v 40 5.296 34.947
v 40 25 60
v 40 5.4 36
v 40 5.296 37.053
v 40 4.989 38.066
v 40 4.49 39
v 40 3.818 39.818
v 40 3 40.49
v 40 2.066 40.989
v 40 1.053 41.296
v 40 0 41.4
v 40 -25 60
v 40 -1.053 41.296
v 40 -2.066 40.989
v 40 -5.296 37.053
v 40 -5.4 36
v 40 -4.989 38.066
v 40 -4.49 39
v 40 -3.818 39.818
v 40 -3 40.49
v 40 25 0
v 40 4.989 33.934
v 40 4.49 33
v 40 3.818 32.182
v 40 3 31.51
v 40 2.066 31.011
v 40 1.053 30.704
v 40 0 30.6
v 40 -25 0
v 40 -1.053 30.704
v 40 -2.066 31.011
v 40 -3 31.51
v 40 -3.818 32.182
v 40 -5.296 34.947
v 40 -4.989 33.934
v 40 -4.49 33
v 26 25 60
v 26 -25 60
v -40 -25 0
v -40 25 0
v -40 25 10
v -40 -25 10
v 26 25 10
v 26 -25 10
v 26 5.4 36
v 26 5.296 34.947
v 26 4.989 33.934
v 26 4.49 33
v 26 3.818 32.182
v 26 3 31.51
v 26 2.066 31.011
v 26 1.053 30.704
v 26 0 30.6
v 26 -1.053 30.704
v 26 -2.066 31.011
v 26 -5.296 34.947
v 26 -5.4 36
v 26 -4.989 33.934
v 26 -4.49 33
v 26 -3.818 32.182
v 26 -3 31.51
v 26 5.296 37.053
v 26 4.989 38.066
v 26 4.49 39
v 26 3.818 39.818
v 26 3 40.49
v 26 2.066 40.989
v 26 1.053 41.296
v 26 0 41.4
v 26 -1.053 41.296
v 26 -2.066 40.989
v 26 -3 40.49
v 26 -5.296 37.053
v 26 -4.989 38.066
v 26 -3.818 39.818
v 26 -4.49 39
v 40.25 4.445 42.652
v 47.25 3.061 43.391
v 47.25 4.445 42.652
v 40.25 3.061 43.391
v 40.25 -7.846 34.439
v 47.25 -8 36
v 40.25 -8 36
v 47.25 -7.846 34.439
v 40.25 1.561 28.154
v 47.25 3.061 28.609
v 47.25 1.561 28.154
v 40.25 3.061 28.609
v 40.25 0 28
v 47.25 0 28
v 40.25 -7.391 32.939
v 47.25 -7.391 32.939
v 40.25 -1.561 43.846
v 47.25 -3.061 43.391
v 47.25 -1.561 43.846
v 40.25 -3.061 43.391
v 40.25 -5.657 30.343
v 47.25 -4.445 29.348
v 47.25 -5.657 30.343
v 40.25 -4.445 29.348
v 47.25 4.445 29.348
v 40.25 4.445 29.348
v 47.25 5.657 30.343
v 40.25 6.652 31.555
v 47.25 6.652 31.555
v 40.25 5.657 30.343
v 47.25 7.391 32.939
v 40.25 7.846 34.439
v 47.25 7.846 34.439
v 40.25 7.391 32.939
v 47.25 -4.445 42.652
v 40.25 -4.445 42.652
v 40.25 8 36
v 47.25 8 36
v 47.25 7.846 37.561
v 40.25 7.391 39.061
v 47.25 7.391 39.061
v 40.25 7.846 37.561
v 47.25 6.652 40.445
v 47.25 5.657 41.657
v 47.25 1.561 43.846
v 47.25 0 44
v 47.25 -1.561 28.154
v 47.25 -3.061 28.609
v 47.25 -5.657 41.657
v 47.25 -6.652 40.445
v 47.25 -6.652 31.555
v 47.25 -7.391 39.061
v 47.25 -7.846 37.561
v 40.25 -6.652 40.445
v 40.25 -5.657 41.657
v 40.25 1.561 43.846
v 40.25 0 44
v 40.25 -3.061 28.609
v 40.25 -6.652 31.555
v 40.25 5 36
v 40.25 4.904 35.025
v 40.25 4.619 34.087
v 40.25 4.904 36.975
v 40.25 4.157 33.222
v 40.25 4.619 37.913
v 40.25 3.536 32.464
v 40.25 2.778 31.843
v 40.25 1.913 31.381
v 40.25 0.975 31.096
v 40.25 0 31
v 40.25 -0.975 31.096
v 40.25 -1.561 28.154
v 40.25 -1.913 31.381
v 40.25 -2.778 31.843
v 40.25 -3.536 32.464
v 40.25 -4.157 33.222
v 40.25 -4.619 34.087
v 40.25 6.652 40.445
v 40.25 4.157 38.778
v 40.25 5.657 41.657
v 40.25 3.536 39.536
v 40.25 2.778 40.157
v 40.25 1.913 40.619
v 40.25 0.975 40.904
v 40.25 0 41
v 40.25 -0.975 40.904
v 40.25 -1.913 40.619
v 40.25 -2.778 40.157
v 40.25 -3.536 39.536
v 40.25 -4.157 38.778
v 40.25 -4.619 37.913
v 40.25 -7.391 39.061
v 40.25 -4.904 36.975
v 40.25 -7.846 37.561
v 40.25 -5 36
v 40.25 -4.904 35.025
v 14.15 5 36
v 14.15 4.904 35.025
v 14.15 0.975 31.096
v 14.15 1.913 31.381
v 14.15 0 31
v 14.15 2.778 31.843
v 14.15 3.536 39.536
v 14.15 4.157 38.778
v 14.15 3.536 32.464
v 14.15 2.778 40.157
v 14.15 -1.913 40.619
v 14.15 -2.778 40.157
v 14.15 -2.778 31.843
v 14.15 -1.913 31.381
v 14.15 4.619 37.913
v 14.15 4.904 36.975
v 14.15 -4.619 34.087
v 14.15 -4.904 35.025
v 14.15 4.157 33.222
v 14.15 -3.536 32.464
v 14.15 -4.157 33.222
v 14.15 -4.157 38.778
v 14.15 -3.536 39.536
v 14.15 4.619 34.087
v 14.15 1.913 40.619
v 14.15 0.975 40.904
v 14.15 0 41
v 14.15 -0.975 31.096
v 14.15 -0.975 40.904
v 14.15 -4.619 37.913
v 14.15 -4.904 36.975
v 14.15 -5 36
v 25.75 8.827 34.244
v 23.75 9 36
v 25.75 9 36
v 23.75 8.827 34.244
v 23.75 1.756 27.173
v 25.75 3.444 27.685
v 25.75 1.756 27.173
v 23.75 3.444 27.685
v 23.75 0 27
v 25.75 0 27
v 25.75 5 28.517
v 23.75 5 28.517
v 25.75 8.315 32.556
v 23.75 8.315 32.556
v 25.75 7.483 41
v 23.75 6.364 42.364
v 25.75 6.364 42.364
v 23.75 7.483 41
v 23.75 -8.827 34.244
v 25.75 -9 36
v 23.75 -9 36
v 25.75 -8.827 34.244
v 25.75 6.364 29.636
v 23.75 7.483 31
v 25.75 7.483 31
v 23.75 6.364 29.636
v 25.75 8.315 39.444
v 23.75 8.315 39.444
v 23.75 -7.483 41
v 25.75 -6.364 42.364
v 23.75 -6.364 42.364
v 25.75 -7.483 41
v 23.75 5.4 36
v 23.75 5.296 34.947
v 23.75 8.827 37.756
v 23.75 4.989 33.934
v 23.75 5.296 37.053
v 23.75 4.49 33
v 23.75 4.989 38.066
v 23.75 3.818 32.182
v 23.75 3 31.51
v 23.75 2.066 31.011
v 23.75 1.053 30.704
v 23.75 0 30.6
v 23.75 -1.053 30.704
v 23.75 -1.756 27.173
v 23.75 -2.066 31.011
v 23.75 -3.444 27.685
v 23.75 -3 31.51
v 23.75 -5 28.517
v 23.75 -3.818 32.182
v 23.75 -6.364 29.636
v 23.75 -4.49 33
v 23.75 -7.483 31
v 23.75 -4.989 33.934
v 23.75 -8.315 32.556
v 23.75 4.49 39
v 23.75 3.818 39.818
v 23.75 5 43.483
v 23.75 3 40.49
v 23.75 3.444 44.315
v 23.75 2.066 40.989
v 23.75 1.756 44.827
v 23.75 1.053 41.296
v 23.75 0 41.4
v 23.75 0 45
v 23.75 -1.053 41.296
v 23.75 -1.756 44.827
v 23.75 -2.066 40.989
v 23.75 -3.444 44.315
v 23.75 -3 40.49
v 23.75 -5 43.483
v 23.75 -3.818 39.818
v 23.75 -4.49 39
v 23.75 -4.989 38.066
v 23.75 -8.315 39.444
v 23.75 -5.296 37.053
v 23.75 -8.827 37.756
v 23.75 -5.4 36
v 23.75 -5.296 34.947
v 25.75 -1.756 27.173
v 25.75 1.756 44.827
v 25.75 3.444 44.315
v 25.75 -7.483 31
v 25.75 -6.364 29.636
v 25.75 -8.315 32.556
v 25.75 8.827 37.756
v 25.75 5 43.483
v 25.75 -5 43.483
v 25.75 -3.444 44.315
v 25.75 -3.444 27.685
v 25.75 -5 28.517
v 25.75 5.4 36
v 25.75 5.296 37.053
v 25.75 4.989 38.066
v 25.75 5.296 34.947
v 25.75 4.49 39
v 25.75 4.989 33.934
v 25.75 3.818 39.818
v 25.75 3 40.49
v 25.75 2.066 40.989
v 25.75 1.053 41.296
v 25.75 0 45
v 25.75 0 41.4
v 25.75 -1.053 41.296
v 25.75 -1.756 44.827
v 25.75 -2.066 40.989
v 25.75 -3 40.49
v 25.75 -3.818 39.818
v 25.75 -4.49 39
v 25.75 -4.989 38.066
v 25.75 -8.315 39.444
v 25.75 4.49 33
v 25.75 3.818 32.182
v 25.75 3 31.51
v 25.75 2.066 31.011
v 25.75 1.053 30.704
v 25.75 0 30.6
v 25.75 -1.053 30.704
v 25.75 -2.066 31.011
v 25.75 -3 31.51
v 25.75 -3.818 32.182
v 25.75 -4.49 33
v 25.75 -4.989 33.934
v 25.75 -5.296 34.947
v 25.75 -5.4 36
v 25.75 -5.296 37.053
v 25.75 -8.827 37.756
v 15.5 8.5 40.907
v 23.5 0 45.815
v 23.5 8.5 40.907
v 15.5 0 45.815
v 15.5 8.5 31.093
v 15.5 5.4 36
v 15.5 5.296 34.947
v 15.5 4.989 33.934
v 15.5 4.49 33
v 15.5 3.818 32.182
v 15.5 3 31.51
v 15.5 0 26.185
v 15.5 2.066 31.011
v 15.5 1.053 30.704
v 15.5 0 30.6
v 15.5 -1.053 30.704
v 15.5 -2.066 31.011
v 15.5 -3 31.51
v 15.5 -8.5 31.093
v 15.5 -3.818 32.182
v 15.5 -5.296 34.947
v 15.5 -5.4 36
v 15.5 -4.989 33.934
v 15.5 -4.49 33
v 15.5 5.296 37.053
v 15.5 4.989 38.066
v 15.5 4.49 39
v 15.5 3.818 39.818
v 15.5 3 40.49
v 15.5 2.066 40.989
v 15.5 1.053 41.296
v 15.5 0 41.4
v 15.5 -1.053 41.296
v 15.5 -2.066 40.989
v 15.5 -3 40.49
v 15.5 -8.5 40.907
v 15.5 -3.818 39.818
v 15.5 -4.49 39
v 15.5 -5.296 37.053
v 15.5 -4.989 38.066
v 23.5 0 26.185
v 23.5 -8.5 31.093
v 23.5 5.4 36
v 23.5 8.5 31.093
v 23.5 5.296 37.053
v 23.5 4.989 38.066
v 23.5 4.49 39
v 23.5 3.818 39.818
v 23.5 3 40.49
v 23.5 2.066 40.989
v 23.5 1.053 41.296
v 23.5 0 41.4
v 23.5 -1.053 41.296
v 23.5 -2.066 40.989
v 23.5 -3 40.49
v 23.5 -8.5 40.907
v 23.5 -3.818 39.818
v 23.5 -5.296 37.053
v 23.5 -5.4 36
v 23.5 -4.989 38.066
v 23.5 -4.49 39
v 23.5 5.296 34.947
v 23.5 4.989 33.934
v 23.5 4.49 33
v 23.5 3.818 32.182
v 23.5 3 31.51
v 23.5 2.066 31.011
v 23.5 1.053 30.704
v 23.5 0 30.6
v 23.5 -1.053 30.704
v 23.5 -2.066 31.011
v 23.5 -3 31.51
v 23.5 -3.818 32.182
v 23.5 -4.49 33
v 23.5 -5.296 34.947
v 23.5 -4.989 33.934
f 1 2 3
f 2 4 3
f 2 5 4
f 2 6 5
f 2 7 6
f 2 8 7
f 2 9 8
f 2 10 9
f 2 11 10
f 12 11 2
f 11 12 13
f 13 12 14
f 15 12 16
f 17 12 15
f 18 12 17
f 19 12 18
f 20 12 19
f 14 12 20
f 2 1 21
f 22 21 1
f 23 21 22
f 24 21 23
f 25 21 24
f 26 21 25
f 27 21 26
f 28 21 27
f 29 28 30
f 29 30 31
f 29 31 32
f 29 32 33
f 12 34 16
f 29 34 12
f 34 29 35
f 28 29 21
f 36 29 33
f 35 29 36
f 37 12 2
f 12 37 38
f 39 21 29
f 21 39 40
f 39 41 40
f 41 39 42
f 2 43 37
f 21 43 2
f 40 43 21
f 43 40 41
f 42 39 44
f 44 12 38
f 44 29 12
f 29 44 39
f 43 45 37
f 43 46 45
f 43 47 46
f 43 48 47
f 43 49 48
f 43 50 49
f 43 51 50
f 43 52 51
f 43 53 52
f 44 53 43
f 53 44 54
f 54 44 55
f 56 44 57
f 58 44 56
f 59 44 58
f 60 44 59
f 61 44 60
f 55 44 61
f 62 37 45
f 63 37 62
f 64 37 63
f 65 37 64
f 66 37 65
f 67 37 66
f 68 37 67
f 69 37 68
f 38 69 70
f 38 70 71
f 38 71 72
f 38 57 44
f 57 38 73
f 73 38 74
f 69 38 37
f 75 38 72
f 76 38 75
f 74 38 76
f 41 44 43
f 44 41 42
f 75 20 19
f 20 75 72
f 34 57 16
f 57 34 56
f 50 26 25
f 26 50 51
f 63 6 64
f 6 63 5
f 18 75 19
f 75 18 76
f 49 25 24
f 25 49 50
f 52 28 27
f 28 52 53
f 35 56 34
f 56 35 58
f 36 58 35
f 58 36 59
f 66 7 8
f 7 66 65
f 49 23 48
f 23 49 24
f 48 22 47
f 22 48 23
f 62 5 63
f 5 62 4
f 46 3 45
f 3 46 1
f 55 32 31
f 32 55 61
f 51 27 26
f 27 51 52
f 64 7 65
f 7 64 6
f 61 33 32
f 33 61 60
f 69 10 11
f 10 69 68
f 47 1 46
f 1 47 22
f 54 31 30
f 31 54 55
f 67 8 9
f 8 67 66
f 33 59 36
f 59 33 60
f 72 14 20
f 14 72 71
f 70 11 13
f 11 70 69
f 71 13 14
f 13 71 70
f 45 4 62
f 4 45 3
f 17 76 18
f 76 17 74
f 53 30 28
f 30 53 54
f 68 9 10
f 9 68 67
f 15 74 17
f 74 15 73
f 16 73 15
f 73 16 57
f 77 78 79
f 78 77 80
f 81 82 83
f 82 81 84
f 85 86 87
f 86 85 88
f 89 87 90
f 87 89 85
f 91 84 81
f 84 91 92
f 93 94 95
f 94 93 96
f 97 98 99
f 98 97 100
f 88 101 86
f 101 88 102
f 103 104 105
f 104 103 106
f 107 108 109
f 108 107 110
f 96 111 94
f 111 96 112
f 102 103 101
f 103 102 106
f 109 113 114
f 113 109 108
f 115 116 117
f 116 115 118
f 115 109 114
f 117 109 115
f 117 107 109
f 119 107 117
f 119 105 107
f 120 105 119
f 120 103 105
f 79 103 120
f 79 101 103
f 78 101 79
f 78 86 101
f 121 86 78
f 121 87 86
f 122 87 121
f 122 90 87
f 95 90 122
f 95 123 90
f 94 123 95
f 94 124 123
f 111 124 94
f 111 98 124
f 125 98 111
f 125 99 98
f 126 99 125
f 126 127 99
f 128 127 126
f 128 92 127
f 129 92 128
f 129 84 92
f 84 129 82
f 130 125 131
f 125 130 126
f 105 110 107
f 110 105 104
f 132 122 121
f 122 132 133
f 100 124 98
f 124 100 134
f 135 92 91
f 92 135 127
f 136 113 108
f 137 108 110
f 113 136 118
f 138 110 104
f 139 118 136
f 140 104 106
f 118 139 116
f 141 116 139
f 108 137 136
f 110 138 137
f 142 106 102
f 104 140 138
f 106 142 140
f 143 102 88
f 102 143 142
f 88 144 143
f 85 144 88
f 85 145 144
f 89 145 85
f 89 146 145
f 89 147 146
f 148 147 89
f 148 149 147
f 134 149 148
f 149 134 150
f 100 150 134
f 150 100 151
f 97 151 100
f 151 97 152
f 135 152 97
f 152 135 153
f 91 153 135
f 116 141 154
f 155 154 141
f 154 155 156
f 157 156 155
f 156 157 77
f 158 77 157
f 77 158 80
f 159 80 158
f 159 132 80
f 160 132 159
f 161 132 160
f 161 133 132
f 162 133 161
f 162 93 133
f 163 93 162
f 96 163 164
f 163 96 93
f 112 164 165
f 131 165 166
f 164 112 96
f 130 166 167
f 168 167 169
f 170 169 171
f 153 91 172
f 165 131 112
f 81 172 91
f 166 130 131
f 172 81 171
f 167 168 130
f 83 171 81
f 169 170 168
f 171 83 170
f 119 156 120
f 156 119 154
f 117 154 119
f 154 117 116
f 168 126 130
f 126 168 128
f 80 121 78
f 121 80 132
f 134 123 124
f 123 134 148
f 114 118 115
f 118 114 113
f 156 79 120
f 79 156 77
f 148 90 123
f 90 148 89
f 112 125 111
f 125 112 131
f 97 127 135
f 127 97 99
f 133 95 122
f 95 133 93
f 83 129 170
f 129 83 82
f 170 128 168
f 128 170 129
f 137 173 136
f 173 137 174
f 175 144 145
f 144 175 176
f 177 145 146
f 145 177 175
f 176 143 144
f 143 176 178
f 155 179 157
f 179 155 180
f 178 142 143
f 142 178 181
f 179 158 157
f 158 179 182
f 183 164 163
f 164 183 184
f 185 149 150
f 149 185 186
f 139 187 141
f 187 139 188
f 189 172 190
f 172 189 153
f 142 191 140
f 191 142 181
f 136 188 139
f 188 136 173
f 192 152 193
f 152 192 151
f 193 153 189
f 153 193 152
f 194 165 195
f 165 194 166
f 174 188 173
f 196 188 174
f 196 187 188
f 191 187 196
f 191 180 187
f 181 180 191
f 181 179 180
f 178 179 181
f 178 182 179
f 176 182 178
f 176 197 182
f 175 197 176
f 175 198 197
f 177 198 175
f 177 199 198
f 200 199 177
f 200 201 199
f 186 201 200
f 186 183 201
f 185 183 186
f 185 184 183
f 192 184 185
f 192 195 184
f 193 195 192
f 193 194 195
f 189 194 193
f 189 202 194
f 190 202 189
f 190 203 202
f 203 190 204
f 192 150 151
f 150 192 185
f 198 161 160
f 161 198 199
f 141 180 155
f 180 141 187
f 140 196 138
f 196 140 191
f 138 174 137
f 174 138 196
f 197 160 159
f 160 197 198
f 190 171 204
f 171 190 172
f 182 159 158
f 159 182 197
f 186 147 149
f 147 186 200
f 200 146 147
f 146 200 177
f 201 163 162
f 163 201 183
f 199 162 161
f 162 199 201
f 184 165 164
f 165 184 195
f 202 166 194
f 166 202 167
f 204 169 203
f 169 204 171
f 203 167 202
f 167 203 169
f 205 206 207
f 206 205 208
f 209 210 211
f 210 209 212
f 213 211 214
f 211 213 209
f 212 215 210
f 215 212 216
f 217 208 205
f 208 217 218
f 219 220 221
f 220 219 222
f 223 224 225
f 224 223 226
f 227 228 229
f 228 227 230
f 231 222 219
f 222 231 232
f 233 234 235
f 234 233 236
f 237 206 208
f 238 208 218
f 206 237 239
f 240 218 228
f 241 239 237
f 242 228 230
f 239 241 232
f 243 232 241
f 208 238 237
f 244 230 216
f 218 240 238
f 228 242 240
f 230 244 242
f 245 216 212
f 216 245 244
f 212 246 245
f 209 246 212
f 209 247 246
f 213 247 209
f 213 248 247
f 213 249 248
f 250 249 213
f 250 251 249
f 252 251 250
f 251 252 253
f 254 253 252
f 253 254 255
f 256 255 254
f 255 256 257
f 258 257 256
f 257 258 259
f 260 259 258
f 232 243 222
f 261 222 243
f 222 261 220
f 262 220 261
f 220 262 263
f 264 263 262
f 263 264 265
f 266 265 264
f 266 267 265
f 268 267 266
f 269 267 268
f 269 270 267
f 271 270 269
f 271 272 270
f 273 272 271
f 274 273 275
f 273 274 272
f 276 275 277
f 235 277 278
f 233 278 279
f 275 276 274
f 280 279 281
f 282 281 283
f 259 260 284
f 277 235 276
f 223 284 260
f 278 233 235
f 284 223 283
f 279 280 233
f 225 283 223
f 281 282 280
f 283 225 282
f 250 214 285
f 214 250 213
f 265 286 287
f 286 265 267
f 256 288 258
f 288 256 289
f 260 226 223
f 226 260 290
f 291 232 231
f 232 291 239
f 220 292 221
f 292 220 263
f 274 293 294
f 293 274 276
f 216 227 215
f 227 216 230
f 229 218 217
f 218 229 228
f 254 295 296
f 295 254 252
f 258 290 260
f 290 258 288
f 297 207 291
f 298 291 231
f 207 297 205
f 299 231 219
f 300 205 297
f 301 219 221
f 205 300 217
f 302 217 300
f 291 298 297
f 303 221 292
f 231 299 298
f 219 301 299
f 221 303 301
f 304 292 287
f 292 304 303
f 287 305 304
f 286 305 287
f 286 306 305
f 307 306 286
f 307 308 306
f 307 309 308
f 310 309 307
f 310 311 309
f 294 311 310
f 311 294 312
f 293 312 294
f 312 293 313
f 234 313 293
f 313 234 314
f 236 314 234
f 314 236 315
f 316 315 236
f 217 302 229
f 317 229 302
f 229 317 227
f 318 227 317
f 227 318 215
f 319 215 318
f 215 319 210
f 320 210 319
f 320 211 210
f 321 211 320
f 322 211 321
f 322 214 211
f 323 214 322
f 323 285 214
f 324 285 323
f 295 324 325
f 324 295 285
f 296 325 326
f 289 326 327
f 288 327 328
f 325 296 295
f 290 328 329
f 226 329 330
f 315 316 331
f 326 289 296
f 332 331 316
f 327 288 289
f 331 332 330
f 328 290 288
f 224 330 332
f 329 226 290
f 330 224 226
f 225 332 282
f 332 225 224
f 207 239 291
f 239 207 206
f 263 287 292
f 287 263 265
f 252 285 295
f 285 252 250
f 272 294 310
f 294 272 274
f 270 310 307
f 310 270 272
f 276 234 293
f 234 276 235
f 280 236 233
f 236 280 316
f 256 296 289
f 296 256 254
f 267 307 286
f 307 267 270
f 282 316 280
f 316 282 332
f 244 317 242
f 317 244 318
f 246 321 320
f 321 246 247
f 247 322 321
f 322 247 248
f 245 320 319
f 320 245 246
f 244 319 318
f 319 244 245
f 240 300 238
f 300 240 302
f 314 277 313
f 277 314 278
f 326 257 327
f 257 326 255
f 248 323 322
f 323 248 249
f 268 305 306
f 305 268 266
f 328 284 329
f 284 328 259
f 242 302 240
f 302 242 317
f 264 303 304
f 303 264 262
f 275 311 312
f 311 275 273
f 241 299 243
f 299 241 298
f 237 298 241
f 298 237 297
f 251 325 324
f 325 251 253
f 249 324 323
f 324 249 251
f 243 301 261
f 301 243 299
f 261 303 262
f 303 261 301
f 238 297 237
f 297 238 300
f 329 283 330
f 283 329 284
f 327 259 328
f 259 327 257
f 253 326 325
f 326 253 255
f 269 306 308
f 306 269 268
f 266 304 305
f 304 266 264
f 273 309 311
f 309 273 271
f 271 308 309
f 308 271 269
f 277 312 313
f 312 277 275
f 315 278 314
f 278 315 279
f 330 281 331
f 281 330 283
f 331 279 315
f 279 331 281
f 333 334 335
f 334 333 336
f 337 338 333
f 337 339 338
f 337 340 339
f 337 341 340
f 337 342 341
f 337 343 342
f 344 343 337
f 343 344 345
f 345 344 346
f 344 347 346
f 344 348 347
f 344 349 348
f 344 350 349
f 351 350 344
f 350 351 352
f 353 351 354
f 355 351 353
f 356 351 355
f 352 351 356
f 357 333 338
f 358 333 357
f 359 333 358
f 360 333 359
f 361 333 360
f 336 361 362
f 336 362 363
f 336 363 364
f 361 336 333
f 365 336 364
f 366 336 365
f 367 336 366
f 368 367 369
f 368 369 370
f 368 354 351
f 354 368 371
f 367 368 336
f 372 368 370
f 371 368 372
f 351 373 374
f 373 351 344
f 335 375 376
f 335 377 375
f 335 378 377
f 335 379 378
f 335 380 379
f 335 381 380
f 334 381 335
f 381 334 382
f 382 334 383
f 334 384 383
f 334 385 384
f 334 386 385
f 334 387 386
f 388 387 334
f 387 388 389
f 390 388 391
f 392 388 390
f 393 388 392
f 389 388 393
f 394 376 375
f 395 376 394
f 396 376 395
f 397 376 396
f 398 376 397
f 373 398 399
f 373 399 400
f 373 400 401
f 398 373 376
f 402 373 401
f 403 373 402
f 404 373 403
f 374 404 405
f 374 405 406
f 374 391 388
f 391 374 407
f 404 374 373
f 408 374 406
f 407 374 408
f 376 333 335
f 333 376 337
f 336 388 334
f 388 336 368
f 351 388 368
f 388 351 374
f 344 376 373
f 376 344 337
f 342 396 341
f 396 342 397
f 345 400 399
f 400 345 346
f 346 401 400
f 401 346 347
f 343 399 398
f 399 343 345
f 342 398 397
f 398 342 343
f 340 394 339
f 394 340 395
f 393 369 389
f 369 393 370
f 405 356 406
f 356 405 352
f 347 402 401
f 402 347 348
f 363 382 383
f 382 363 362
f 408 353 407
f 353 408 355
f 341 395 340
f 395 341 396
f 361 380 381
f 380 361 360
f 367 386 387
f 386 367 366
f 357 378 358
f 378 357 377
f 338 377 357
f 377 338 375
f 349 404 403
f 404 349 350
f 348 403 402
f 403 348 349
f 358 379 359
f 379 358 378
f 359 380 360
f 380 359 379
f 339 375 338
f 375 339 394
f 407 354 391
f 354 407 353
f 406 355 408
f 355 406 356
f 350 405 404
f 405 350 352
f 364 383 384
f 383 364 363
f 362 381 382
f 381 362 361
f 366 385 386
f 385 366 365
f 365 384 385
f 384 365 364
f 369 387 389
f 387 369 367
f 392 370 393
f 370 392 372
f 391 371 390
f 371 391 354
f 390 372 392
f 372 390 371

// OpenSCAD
$fn = 32;

// ------------------------------------------------------------------------
// Bolted bracket: 80 x 50 mm bracket with 1 bolt joints
// Every part is its own module, assembly() places them once.
// ------------------------------------------------------------------------

// --- part 1 ---
module bracket() {
  difference() {
    translate([-40, -25, 0]) cube([80, 50, 60]);
    translate([-41, -26, 10]) cube([67, 52, 51]);
    translate([33, 0, 36]) rotate([0, 90, 0]) cylinder(h = 16, d = 10.8, center = true);
  }
}

// --- part 2 ---
module bolt() {
  cylinder(h = 7, d = 16);
  translate([0, 0, -26.1]) cylinder(h = 26.1, d = 10);
}

// --- part 3 ---
module washer() {
  difference() {
      translate([0, 0, 0]) cylinder(h = 2, d = 18);
      translate([0, 0, -1]) cylinder(h = 4, d = 10.8);
    }
}

// --- part 4 ---
module nut() {
  difference() {
    linear_extrude(height = 8) polygon(points = [[9.815, 0], [4.907, 8.5], [-4.907, 8.5], [-9.815, 0], [-4.907, -8.5], [4.907, -8.5]]);
    translate([0, 0, -1]) cylinder(h = 10, d = 10.8);
  }
}

// --- assembly ---
module assembly() {
  translate([0, 0, 0]) rotate([0, 0, 0]) bracket();
  translate([40.25, 0, 36]) rotate([0, 90, 0]) bolt();
  translate([23.75, 0, 36]) rotate([0, 90, 0]) washer();
  translate([15.5, 0, 36]) rotate([0, 90, 0]) nut();
}

assembly();
